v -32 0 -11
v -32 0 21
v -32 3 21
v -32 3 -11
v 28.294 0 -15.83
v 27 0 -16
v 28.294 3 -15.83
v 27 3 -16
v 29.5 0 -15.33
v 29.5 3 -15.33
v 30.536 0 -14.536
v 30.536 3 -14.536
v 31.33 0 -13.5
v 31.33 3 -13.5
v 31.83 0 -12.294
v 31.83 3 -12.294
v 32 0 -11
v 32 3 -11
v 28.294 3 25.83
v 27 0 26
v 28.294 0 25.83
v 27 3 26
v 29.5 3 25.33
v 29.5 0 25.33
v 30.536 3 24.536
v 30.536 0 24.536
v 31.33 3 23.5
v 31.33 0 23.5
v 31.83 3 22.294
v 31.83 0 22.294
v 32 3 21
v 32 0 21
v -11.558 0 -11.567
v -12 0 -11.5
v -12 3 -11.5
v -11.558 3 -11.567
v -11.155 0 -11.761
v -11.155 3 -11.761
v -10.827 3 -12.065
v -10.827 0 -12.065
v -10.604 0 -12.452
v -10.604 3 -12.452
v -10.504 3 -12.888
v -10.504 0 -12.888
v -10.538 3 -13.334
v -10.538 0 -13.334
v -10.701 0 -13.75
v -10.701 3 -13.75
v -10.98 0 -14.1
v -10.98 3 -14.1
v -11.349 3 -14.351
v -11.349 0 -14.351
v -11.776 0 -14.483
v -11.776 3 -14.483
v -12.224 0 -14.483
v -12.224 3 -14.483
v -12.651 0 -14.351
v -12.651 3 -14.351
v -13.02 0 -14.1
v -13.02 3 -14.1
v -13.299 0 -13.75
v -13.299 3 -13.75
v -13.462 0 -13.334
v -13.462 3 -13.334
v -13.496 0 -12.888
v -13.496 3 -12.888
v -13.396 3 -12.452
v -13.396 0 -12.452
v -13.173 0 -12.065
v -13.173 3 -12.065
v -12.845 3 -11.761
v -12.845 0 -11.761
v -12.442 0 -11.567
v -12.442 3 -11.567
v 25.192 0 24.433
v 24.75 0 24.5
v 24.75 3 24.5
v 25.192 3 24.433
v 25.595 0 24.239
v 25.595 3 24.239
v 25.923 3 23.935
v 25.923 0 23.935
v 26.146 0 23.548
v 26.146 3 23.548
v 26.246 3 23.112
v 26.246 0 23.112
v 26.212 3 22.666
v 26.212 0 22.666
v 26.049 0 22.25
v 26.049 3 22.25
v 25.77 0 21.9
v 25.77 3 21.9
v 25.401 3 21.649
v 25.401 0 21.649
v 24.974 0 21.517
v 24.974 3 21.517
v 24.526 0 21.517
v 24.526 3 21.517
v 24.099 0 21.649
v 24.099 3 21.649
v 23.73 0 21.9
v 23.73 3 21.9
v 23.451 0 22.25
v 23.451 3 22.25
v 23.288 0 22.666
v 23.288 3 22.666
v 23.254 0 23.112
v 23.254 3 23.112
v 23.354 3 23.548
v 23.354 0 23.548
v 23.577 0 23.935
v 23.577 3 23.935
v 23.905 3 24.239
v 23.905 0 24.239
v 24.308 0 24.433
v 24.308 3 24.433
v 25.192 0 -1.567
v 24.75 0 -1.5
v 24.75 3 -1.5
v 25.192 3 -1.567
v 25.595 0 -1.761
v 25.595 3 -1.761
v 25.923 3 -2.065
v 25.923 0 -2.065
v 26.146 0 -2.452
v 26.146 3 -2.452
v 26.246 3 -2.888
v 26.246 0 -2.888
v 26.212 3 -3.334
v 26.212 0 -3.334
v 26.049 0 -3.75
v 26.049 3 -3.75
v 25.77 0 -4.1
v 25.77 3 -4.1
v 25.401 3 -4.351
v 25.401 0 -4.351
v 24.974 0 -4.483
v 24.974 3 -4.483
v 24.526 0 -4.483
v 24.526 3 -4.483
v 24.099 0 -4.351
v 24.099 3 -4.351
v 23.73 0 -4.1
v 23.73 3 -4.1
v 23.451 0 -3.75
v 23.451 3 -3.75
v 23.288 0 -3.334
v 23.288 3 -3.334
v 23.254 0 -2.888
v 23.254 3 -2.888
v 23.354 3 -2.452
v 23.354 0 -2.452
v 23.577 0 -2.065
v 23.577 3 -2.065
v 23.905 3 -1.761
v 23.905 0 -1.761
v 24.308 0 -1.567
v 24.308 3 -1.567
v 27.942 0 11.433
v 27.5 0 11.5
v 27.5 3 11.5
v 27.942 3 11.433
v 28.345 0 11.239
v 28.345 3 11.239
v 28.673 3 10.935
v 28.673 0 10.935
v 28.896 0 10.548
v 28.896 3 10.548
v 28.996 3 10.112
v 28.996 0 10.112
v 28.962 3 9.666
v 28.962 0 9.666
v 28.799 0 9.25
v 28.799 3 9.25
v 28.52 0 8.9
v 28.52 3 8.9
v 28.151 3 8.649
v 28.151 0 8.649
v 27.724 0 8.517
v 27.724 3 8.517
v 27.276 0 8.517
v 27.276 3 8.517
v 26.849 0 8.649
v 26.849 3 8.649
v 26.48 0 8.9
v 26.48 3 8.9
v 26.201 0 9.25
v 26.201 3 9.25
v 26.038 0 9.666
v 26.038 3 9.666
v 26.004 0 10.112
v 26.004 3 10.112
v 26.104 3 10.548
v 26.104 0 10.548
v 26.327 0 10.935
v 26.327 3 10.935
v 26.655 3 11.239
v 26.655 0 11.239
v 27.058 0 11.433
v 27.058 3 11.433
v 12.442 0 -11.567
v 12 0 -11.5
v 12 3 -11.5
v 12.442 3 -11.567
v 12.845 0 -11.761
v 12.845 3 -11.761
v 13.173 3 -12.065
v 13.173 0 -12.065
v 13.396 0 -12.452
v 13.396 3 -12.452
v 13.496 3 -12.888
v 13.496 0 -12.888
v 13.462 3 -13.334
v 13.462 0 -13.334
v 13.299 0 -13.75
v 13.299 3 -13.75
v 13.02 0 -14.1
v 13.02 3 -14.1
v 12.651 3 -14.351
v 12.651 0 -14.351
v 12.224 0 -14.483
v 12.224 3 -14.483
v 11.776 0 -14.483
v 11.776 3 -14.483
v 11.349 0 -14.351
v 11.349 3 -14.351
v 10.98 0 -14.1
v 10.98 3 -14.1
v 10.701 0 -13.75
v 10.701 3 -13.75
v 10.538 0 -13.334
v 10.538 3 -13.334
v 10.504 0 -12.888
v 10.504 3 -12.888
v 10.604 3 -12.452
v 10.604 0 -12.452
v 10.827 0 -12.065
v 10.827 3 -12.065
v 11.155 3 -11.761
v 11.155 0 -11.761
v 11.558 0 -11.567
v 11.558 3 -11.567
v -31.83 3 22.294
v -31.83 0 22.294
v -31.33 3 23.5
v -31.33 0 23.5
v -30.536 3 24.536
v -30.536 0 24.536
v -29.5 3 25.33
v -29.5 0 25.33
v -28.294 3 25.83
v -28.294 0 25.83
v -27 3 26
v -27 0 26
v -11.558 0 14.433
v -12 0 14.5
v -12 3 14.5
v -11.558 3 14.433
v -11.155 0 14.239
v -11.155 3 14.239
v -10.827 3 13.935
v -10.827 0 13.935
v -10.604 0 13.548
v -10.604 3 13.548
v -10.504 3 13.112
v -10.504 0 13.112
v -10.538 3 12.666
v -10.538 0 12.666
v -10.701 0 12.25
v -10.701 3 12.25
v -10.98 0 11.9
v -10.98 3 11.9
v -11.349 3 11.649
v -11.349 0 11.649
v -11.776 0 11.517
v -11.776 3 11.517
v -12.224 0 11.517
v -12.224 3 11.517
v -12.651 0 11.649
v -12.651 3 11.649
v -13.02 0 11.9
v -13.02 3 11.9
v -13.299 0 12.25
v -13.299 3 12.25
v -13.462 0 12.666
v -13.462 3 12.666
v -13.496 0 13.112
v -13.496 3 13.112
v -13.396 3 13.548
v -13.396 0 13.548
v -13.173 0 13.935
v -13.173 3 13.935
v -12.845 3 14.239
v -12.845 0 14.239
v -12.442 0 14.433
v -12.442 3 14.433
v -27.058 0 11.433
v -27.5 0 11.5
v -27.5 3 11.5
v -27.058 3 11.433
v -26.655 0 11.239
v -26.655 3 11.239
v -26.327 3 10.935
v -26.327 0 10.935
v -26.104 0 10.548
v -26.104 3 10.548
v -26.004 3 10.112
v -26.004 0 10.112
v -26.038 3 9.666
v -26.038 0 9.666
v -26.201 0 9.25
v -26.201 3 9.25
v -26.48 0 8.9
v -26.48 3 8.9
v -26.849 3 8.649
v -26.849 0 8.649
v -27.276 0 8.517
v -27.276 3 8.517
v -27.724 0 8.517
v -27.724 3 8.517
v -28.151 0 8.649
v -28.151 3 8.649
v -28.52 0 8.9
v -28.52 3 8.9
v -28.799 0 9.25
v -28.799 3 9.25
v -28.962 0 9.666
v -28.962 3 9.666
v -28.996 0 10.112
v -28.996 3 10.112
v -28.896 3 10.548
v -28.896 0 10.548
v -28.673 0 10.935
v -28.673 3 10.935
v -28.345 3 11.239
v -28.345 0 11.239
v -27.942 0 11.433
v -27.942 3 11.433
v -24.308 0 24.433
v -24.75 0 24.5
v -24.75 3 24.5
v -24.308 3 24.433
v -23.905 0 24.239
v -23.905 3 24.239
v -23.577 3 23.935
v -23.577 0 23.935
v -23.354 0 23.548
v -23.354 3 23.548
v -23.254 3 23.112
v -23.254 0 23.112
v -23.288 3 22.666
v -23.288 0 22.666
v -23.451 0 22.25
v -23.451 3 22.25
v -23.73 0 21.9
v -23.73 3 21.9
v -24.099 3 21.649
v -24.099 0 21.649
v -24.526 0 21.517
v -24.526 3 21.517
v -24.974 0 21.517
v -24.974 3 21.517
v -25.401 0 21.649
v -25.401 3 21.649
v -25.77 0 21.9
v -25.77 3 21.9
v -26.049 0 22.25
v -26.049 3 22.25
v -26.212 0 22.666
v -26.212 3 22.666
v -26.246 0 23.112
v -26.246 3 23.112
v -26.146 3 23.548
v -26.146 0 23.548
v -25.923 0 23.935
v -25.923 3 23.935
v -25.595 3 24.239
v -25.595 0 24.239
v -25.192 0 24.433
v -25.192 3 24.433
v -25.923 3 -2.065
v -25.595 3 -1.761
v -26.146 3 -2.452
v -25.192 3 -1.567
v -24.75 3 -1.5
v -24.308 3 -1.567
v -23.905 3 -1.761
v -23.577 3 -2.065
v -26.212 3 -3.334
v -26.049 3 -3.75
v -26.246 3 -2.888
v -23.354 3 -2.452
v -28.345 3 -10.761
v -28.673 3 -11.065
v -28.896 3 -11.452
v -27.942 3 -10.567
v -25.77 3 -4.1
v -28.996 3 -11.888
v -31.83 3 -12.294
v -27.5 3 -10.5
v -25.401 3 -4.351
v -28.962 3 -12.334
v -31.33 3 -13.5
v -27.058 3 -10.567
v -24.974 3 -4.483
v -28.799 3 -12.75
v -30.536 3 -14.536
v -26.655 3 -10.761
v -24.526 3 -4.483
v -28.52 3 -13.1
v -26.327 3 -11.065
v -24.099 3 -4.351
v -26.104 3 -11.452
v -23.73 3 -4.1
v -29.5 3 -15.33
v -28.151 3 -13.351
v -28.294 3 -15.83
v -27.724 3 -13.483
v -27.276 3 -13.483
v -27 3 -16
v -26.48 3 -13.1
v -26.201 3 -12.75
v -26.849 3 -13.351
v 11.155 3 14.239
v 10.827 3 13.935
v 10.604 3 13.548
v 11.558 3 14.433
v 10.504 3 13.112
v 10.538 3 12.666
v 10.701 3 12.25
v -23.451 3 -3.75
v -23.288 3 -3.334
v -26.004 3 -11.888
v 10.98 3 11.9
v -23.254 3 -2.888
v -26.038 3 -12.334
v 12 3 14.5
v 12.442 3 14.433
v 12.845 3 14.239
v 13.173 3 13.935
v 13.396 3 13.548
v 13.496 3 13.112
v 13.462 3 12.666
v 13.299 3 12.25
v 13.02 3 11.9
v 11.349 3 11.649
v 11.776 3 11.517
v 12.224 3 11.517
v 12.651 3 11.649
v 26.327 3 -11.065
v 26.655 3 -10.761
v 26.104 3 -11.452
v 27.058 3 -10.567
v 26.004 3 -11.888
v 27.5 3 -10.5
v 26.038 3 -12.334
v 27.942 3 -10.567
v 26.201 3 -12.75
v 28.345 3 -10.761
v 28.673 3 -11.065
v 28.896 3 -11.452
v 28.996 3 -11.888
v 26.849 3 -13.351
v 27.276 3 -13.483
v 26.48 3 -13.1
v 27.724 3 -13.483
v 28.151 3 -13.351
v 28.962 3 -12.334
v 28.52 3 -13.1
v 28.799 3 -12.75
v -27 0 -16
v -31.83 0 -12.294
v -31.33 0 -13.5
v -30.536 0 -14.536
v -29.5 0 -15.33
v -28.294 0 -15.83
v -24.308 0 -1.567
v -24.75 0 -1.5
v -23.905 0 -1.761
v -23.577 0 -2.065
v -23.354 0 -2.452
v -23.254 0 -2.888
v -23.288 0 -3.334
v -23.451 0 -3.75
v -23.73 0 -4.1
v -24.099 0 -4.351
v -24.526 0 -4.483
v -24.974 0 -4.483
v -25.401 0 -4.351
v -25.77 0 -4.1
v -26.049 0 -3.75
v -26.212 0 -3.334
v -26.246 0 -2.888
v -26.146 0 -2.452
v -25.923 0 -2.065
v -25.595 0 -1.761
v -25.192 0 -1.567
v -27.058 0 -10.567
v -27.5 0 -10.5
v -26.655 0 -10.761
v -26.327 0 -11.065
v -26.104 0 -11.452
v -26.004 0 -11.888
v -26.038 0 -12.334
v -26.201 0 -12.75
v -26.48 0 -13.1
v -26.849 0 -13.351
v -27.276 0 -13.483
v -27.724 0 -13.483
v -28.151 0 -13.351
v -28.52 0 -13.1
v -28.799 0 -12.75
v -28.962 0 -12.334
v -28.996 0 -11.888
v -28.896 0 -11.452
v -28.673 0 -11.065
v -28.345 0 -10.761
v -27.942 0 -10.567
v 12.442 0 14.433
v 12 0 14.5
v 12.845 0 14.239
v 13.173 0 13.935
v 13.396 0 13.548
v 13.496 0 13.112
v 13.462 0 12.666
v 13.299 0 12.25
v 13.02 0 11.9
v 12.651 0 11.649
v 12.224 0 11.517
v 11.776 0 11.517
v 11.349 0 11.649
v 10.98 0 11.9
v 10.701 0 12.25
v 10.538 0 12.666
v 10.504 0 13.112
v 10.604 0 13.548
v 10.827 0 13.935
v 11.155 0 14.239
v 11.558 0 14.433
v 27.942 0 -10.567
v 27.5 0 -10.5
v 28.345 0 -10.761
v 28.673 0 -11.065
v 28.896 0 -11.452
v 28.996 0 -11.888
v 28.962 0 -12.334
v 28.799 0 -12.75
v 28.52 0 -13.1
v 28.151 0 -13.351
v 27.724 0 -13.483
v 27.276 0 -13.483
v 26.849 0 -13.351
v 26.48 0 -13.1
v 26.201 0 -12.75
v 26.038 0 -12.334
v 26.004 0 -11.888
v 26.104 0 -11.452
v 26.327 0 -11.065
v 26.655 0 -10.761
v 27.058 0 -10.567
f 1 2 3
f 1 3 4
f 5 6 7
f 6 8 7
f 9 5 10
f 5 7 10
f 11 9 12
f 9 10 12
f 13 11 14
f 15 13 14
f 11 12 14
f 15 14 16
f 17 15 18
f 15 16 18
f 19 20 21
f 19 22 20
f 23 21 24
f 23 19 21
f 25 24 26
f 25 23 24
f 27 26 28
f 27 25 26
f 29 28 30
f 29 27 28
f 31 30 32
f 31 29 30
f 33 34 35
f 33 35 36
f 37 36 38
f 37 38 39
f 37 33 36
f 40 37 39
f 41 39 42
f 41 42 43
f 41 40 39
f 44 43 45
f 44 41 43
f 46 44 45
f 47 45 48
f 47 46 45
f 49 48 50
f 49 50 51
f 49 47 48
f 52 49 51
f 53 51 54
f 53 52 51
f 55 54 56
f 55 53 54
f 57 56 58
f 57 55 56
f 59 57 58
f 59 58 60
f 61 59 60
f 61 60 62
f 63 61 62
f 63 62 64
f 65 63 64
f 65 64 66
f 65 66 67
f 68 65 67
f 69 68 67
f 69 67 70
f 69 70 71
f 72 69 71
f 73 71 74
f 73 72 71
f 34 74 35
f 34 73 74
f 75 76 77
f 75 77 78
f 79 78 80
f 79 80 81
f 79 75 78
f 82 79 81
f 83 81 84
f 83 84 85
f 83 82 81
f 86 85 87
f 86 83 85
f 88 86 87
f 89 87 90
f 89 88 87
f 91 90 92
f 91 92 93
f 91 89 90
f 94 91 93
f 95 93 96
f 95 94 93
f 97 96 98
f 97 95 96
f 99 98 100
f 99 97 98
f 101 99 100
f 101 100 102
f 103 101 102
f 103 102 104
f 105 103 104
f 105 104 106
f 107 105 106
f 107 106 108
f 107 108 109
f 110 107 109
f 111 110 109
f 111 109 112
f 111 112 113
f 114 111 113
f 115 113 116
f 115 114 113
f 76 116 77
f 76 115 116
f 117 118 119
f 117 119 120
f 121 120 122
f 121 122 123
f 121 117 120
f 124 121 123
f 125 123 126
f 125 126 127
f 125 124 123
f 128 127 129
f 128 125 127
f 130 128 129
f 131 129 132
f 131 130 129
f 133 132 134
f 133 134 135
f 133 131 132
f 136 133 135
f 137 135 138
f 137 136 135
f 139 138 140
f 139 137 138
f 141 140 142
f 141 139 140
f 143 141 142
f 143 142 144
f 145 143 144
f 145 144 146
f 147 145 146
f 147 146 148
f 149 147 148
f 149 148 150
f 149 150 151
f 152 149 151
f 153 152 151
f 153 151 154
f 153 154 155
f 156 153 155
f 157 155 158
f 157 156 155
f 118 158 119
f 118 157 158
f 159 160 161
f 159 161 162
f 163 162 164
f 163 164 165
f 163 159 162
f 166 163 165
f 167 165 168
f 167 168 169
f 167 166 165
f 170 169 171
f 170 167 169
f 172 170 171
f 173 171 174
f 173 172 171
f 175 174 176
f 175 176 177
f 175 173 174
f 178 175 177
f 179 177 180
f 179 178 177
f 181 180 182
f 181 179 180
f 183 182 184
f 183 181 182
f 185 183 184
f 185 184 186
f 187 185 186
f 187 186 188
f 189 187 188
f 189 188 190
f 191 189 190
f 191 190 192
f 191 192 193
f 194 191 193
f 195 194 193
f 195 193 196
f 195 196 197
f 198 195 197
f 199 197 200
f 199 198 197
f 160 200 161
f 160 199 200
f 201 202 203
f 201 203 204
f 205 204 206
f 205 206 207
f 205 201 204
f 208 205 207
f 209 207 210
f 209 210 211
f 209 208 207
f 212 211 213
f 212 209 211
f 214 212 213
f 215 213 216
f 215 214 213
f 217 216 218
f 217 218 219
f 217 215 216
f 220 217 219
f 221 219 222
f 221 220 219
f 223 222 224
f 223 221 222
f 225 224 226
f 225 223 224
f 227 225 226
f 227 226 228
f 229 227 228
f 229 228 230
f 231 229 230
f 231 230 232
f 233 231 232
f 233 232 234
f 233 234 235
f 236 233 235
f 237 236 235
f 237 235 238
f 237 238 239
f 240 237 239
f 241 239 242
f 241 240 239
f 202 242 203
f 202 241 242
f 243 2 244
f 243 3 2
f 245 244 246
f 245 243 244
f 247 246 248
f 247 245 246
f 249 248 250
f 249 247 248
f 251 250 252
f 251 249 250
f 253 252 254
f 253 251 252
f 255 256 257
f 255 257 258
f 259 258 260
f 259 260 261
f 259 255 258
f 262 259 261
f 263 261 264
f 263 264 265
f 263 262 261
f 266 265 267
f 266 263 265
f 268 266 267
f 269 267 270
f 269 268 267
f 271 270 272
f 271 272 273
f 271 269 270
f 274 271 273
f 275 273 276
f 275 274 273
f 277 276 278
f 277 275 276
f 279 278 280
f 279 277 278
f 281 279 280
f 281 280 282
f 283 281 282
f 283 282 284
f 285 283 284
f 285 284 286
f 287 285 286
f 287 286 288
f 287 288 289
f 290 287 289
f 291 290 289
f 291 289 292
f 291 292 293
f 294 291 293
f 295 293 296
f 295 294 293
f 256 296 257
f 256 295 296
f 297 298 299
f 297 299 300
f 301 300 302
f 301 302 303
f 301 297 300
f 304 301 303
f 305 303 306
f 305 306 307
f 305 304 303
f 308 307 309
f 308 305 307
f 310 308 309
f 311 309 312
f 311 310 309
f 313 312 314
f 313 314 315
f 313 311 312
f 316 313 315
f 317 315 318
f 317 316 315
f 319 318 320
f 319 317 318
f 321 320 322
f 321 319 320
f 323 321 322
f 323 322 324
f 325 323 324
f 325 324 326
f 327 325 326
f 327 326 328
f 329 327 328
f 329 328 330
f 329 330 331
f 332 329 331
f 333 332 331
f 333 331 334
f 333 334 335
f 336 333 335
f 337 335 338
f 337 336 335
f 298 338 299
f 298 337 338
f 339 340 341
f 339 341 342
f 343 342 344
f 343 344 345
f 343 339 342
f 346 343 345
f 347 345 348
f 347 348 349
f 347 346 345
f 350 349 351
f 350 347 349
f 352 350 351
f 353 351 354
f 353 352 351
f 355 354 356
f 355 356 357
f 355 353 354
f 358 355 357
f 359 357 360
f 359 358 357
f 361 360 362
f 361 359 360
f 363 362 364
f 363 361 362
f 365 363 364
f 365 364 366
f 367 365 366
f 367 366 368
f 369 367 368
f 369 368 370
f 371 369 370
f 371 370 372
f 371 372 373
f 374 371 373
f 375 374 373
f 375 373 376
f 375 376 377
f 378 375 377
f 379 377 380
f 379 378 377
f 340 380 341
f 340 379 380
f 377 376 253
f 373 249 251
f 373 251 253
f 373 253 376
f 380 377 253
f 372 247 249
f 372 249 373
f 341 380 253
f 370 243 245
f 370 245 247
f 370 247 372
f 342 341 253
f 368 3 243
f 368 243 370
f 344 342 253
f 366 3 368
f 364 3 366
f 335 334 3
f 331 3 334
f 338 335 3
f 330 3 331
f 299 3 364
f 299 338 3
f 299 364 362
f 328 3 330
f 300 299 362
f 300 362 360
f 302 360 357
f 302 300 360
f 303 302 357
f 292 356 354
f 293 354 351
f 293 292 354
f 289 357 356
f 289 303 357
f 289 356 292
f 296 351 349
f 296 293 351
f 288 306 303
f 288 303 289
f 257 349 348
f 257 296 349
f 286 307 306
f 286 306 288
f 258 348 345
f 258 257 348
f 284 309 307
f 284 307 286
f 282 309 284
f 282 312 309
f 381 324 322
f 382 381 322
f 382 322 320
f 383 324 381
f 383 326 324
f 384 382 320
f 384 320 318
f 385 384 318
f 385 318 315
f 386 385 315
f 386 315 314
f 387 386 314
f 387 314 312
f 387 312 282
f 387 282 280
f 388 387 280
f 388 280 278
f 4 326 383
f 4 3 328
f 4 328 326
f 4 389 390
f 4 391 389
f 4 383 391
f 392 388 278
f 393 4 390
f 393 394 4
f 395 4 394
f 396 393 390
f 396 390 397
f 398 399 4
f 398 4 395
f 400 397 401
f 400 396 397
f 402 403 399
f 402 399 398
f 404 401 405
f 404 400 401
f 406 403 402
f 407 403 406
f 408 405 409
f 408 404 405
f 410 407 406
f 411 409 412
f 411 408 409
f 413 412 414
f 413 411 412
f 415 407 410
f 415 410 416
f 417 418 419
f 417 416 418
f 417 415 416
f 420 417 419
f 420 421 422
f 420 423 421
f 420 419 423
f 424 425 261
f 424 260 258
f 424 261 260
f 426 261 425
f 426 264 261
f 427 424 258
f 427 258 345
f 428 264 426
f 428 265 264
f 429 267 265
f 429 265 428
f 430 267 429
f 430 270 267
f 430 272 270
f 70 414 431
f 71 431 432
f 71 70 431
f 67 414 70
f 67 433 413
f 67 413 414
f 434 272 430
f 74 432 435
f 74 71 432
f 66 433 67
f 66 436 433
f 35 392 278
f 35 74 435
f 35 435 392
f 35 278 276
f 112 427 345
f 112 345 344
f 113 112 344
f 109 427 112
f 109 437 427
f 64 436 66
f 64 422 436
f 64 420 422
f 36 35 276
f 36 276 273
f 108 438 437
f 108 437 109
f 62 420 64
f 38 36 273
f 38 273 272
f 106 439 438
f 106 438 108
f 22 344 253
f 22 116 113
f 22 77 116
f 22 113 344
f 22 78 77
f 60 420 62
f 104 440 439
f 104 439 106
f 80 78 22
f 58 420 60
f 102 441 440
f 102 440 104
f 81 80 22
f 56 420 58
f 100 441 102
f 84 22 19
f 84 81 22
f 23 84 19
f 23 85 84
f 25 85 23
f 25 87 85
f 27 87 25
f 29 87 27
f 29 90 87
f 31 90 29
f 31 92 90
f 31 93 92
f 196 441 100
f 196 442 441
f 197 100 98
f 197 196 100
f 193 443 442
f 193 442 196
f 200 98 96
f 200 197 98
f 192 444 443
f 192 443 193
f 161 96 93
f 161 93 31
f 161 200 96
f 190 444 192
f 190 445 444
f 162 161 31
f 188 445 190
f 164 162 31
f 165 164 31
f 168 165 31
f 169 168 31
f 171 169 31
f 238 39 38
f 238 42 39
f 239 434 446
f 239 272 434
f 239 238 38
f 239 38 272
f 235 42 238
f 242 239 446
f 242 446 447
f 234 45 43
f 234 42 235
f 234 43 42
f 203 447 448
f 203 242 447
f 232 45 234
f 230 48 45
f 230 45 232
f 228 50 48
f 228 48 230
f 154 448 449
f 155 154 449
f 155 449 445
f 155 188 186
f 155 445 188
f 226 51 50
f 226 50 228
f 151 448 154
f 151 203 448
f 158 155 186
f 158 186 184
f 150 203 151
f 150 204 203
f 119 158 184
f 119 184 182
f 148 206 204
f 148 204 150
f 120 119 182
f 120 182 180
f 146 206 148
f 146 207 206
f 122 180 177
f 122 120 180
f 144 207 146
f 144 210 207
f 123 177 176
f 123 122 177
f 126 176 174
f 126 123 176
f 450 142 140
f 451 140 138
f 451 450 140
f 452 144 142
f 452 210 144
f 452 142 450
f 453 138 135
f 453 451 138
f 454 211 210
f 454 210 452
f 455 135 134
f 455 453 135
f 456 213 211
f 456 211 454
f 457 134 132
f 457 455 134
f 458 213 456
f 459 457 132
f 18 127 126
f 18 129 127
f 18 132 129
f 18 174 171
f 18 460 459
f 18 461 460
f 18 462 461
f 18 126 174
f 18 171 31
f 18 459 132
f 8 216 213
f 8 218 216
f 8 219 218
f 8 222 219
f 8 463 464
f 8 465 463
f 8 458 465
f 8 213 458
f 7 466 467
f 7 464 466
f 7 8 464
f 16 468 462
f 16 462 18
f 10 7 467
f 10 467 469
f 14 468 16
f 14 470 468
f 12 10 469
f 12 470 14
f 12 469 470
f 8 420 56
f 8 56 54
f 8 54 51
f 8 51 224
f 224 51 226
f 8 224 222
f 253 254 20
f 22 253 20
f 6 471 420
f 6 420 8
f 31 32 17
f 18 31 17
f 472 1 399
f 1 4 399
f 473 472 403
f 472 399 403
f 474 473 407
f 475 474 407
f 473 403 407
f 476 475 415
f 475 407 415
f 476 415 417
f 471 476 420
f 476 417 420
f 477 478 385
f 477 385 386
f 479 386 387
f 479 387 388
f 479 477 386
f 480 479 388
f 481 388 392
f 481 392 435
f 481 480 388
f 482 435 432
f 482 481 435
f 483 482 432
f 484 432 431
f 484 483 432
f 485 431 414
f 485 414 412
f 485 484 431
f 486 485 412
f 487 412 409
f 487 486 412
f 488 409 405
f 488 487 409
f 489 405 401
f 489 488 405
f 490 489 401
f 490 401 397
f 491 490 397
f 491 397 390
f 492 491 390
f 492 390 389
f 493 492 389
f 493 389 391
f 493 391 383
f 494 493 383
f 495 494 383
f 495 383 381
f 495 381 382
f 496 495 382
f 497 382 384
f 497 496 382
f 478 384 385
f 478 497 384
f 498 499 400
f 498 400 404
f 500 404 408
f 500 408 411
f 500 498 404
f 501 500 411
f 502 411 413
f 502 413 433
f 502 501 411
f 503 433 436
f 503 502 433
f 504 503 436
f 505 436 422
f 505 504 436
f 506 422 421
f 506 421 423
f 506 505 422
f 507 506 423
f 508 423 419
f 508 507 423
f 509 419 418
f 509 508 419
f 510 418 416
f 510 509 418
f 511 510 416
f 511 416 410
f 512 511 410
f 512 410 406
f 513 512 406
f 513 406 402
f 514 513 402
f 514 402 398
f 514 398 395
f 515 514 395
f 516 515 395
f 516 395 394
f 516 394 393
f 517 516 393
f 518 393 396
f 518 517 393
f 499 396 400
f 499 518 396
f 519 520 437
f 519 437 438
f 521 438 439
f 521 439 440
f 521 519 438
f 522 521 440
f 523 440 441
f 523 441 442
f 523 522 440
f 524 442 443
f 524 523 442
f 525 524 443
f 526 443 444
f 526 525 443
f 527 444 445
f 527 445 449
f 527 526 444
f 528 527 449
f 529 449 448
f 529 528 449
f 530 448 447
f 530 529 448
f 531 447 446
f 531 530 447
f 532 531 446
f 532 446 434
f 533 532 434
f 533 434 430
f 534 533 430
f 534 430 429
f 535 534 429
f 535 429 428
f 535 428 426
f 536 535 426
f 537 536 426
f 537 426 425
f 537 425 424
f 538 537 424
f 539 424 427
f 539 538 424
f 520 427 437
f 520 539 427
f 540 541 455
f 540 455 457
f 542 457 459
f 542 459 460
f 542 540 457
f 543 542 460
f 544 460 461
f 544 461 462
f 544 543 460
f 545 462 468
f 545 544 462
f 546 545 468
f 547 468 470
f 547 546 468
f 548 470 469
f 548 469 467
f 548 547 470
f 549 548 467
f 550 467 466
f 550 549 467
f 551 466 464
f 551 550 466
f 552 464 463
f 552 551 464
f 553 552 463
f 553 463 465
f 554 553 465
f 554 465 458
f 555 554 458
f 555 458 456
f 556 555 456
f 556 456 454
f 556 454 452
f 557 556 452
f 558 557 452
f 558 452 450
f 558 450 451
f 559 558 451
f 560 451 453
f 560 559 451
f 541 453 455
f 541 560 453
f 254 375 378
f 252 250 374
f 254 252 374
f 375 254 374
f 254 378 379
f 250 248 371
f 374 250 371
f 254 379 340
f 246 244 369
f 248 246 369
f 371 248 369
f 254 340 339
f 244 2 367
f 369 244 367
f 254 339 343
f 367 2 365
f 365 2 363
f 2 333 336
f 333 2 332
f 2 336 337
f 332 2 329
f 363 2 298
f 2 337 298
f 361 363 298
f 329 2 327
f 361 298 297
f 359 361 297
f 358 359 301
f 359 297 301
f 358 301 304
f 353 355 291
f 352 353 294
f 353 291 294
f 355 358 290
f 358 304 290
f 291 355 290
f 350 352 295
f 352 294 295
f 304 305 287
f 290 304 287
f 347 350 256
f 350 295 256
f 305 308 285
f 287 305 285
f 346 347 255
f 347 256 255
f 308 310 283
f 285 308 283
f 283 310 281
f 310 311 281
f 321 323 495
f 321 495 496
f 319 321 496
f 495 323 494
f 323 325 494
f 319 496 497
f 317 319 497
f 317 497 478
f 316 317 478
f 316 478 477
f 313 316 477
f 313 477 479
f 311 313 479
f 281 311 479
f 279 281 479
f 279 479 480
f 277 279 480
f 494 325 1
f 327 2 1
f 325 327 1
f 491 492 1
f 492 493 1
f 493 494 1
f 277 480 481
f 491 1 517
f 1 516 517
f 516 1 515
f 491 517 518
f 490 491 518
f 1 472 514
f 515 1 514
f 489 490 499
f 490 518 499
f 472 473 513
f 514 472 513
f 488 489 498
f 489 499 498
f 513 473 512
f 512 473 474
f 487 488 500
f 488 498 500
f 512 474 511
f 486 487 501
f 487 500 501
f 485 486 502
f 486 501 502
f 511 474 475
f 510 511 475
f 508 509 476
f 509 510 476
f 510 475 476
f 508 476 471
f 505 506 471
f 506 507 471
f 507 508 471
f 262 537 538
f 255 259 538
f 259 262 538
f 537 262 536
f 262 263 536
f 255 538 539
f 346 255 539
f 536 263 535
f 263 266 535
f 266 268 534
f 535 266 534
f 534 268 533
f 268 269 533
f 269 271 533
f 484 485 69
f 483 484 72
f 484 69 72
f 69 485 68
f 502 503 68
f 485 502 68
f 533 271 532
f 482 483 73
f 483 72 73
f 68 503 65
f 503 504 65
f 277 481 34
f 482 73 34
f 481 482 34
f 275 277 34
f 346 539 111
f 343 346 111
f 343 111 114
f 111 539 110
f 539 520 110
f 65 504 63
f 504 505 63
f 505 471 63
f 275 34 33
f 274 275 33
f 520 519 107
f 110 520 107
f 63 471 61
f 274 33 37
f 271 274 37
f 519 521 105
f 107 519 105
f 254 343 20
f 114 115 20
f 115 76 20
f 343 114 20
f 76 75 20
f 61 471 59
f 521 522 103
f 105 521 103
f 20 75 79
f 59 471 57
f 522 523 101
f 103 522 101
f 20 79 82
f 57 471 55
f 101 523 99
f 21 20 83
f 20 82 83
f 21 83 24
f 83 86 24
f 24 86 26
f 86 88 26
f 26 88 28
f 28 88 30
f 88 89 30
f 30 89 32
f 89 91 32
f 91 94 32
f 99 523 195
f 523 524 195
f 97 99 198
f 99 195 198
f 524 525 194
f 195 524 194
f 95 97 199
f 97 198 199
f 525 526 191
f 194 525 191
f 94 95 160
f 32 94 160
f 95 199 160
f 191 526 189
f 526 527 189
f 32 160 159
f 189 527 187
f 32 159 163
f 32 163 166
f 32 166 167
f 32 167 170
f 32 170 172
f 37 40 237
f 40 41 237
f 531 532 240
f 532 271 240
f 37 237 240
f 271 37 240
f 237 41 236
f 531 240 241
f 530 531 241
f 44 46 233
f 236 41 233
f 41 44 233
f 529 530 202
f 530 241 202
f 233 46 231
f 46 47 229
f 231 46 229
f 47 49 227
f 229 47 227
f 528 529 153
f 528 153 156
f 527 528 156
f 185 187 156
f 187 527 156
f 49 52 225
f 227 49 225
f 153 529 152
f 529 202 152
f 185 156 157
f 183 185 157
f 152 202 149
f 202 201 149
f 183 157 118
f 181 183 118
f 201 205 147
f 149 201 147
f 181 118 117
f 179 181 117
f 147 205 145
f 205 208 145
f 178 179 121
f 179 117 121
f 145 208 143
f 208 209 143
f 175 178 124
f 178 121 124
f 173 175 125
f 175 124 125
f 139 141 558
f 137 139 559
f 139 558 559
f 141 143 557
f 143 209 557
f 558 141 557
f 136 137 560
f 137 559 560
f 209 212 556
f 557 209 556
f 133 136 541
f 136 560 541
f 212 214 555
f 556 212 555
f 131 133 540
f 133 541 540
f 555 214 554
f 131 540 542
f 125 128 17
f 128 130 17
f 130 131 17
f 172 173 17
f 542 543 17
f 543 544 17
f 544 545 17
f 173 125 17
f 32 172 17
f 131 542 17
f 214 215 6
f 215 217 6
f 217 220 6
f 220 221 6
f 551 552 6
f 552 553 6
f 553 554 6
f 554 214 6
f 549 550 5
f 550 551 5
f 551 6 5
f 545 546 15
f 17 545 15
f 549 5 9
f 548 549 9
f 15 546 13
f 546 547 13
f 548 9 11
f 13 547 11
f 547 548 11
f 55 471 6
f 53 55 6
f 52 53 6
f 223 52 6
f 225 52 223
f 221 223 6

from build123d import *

# Parameters (mm, degrees)
SKETCH_1_W      = 64
SKETCH_1_H      = 42
SKETCH_1_R      = 1.5
EXTRUDE_1_DEPTH = 3
FILLET_2_R      = 5


with BuildPart() as part:
    # 草图1 → 凸台-拉伸1 (new body)
    with BuildSketch(Plane(origin=(0, 0, 0), x_dir=(1, 0, 0), z_dir=(0, 1, 0))):
        with Locations((0, -5)):
            Rectangle(SKETCH_1_W, SKETCH_1_H)
        with Locations(Location((-27.5, -10, 0), (0, 0, 270))):
            Circle(SKETCH_1_R, mode=Mode.SUBTRACT)
        with Locations(Location((-12, -13, 0), (0, 0, 270))):
            Circle(SKETCH_1_R, mode=Mode.SUBTRACT)
        with Locations(Location((12, -13, 0), (0, 0, 270))):
            Circle(SKETCH_1_R, mode=Mode.SUBTRACT)
        with Locations(Location((27.5, -10, 0), (0, 0, 270))):
            Circle(SKETCH_1_R, mode=Mode.SUBTRACT)
        with Locations(Location((-24.75, 3, 0), (0, 0, 270))):
            Circle(SKETCH_1_R, mode=Mode.SUBTRACT)
        with Locations(Location((-27.5, 12, 0), (0, 0, 270))):
            Circle(SKETCH_1_R, mode=Mode.SUBTRACT)
        with Locations(Location((-12, 13, 0), (0, 0, 270))):
            Circle(SKETCH_1_R, mode=Mode.SUBTRACT)
        with Locations(Location((24.75, 3, 0), (0, 0, 270))):
            Circle(SKETCH_1_R, mode=Mode.SUBTRACT)
        with Locations(Location((12, 13, 0), (0, 0, 270))):
            Circle(SKETCH_1_R, mode=Mode.SUBTRACT)
        with Locations(Location((27.5, 12, 0), (0, 0, 270))):
            Circle(SKETCH_1_R, mode=Mode.SUBTRACT)
        with Locations(Location((24.75, -23, 0), (0, 0, 270))):
            Circle(SKETCH_1_R, mode=Mode.SUBTRACT)
        with Locations(Location((-24.75, -23, 0), (0, 0, 270))):
            Circle(SKETCH_1_R, mode=Mode.SUBTRACT)
    extrude(amount=EXTRUDE_1_DEPTH)

    # 圆角2
    fillet_2_edges = [part.edges().sort_by_distance(p)[0] for p in [
        (-32, 1.5, -16),
        (32, 1.5, -16),
        (32, 1.5, 26),
        (-32, 1.5, 26),
    ]]
    fillet(fillet_2_edges, radius=FILLET_2_R)


solid = part.part
